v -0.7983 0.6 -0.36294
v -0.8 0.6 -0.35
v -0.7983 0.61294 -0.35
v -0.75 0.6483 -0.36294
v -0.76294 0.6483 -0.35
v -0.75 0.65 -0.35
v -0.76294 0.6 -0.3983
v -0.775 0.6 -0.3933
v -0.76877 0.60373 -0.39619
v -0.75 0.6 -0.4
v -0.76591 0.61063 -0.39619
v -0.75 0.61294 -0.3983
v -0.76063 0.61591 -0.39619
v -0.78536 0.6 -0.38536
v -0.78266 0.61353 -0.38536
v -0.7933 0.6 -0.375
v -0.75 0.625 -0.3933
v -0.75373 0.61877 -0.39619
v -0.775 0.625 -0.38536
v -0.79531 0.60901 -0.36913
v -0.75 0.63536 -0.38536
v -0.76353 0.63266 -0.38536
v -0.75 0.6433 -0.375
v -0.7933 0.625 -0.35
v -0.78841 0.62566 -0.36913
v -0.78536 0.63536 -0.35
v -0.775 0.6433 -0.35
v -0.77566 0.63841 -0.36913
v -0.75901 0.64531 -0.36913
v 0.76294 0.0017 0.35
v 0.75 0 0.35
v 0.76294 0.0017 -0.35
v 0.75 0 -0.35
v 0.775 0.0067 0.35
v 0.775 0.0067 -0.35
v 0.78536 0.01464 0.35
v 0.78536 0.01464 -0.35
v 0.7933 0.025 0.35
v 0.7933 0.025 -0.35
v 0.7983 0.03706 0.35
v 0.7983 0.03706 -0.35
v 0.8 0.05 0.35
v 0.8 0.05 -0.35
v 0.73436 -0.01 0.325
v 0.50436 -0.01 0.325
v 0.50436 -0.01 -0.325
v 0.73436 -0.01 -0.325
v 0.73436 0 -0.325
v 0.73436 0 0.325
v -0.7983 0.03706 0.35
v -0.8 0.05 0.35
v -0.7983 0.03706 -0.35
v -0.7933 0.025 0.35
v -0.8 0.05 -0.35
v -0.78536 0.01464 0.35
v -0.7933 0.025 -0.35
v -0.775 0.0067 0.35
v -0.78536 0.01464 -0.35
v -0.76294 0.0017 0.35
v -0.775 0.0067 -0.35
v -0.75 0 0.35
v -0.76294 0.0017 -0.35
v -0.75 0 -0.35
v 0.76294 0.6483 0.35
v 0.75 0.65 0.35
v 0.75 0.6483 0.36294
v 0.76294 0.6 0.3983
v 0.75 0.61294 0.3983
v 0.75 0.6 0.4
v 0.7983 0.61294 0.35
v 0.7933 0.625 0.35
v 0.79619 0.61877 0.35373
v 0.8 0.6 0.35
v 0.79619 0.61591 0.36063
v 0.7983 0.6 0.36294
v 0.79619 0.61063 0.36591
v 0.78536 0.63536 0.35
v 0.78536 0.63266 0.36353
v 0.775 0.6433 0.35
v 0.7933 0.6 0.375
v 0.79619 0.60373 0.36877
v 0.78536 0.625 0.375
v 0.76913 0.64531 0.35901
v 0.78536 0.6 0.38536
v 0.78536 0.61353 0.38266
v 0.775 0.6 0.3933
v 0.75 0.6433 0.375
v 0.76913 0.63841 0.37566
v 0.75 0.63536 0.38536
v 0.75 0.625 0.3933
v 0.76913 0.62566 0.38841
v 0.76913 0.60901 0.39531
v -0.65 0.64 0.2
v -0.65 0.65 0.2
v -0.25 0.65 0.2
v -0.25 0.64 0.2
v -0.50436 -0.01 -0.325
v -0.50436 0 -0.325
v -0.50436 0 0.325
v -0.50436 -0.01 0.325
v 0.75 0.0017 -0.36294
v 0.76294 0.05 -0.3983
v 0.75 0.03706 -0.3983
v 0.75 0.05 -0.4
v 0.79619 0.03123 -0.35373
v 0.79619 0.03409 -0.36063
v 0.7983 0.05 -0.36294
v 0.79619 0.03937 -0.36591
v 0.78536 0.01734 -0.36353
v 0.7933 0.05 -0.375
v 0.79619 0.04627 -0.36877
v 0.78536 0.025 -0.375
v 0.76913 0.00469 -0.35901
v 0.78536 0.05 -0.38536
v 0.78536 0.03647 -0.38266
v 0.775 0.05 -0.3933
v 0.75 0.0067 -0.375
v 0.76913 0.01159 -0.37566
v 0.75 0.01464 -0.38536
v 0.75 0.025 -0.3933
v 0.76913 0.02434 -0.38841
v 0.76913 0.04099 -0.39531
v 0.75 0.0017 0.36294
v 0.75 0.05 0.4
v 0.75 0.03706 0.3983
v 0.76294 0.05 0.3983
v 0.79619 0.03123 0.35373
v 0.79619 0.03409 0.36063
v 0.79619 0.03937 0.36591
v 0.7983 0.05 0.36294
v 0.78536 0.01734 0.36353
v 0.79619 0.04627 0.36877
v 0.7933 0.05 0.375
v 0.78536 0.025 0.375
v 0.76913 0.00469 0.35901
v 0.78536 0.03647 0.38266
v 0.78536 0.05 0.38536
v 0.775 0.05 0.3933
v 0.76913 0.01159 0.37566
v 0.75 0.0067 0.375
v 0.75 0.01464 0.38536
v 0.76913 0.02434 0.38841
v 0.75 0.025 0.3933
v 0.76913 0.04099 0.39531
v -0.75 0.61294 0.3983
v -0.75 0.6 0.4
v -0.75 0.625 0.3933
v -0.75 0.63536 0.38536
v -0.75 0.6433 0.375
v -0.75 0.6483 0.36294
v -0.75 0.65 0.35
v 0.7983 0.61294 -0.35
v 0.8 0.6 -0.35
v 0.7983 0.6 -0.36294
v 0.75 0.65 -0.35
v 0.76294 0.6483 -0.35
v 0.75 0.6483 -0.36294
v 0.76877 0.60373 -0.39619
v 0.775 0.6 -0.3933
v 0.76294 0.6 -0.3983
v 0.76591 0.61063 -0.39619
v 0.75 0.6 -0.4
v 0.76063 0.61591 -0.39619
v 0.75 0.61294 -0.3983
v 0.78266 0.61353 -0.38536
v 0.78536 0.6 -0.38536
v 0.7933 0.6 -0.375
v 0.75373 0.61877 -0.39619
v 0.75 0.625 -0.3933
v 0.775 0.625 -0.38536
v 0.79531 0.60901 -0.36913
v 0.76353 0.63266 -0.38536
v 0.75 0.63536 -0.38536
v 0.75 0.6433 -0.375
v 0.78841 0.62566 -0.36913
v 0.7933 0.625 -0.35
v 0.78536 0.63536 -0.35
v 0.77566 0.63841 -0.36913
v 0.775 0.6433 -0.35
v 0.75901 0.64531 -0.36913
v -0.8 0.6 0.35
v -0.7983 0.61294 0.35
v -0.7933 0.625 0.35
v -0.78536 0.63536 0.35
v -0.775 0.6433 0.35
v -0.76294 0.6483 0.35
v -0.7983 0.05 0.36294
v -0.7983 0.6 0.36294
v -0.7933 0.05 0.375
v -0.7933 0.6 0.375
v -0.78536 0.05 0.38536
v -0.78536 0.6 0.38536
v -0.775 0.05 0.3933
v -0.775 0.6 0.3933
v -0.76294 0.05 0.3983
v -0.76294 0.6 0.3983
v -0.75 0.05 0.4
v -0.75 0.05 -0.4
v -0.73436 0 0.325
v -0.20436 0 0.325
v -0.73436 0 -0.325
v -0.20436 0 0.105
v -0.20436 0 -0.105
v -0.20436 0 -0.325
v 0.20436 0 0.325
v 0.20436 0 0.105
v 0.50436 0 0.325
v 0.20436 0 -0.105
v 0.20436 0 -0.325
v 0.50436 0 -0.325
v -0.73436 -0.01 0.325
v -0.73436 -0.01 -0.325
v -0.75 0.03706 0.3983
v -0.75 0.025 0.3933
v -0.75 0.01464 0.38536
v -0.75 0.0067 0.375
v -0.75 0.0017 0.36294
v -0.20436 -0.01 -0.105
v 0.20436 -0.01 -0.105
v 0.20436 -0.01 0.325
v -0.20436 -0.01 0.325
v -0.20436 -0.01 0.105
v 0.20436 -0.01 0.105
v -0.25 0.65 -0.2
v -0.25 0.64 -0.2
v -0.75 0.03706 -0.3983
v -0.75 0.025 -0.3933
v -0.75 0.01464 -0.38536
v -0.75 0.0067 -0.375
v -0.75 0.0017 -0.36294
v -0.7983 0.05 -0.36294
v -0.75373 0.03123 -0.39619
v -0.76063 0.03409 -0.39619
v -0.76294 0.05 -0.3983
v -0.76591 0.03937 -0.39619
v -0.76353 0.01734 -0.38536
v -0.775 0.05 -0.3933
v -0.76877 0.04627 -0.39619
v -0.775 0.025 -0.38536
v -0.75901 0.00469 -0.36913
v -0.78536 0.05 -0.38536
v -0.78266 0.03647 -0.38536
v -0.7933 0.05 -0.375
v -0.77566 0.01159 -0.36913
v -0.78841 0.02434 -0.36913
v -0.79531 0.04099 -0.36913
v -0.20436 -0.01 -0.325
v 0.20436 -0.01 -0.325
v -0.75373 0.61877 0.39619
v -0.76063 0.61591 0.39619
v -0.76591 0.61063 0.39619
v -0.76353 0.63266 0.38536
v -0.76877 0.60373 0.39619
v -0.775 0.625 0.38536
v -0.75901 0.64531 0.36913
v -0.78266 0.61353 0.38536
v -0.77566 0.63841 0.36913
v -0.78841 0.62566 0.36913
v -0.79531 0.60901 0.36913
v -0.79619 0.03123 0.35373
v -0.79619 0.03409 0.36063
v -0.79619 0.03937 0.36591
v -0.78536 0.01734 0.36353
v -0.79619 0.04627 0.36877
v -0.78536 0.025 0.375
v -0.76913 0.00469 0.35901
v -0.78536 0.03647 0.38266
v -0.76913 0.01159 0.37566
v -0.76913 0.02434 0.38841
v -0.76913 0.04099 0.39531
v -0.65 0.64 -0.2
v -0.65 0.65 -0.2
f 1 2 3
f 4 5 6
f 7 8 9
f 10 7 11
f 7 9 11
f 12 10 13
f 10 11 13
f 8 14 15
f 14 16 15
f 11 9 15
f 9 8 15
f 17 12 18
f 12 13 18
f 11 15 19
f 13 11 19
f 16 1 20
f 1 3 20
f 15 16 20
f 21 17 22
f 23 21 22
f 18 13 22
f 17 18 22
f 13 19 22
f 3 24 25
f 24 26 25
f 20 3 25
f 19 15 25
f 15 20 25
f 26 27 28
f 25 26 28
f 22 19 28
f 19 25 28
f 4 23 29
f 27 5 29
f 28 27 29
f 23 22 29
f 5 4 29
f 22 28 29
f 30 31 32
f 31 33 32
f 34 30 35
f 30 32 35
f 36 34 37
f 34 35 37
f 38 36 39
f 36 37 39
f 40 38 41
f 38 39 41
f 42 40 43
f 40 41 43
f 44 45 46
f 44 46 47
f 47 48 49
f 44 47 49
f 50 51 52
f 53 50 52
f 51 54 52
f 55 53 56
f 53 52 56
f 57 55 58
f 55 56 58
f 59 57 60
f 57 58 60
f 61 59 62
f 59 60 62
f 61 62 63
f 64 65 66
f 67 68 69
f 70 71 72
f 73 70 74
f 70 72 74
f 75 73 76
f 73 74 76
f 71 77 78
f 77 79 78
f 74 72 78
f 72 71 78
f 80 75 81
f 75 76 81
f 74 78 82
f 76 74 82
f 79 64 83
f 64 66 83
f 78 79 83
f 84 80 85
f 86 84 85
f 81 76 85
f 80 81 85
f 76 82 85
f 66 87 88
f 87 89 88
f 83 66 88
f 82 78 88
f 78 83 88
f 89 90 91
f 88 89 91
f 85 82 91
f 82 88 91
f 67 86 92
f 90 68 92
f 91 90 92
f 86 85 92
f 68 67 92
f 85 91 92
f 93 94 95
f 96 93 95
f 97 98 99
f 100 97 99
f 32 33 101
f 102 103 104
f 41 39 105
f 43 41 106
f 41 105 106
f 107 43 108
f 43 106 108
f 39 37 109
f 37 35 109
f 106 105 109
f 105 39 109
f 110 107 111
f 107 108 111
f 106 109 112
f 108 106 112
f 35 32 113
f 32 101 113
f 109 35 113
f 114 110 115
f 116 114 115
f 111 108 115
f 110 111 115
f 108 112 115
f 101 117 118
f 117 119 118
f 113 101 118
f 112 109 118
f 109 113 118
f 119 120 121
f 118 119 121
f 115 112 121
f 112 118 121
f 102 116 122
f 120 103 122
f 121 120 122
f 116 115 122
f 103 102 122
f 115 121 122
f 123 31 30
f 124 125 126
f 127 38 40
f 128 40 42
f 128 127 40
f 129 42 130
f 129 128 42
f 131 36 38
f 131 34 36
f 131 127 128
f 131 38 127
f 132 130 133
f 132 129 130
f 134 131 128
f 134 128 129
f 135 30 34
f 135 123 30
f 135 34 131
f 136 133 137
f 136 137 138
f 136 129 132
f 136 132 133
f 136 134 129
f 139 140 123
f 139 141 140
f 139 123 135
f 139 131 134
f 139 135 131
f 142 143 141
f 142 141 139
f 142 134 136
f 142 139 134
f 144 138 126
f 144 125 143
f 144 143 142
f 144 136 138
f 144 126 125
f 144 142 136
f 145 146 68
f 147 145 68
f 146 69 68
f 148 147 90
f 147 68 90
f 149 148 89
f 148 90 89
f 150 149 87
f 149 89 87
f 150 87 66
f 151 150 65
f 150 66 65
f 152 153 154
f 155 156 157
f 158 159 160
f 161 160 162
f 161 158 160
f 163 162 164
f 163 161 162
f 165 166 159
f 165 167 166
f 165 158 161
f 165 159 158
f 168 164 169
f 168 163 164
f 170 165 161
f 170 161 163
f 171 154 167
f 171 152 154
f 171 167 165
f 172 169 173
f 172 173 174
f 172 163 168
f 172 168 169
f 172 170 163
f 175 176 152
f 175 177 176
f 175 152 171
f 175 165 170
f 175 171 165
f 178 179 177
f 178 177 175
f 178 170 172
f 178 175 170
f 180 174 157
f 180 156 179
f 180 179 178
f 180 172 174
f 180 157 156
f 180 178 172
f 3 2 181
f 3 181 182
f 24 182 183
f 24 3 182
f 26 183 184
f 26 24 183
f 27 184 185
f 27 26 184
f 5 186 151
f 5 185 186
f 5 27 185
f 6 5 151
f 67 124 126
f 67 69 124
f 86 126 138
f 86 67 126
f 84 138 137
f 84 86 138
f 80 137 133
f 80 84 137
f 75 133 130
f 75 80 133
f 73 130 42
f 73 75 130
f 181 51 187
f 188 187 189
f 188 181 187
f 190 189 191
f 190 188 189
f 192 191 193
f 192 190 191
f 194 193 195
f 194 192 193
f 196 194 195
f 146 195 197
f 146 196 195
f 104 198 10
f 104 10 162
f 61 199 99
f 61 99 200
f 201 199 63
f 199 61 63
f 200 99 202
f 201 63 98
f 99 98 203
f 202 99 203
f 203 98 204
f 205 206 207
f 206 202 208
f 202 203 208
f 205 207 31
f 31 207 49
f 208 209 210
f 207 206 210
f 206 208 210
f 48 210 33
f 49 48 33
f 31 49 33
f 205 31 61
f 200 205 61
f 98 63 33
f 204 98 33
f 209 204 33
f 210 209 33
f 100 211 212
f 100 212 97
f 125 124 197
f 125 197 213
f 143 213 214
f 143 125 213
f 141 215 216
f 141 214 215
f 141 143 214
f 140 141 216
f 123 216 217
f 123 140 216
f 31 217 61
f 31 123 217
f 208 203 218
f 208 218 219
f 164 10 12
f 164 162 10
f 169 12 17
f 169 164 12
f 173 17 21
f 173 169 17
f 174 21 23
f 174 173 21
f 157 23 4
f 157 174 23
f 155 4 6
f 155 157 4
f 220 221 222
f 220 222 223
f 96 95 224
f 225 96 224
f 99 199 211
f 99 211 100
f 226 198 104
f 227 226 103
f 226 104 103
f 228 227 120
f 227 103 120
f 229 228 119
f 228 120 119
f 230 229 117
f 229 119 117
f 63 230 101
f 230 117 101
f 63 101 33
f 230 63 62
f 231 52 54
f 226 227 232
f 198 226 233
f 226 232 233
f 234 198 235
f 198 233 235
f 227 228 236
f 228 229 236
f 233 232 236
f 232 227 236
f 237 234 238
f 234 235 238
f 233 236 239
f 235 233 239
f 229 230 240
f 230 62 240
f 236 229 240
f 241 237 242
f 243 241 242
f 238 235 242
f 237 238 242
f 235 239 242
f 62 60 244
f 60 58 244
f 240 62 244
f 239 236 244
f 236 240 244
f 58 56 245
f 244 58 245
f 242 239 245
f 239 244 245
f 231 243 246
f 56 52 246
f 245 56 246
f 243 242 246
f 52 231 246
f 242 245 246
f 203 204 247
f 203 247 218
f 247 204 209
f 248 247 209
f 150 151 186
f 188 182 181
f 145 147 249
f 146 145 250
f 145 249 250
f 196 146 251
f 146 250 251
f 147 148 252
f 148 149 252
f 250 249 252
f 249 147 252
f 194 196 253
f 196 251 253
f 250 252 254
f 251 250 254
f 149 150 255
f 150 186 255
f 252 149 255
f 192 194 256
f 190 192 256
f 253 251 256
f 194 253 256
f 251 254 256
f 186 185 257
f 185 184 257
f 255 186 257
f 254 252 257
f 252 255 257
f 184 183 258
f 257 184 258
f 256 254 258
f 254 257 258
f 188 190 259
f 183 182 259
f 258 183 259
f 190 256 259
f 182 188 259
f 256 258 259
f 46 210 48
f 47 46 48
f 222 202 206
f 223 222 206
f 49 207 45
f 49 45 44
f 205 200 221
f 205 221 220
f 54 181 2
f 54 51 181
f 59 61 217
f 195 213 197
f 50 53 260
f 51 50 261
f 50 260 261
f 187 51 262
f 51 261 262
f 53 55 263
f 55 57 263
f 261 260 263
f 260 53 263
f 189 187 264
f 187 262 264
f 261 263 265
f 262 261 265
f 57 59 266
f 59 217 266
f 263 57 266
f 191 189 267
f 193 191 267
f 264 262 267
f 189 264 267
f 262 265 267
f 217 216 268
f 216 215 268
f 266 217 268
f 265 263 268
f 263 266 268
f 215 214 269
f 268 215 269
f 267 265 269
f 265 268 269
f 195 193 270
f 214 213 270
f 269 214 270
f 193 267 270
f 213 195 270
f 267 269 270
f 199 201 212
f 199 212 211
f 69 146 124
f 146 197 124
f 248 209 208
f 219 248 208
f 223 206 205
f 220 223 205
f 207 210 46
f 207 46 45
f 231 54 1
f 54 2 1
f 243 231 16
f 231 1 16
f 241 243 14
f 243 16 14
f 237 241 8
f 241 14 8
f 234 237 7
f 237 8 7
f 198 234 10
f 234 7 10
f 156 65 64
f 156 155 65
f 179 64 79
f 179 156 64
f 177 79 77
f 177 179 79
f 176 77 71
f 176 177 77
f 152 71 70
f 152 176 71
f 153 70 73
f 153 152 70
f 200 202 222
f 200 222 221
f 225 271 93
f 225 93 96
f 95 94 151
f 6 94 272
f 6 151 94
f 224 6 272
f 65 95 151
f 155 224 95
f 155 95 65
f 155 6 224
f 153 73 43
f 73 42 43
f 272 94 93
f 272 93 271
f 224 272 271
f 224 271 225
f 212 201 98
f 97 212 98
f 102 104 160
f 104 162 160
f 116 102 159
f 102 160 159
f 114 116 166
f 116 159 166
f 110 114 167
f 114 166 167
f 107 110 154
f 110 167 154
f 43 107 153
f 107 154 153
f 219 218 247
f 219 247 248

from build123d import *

# Parameters (mm, degrees)
SKETCH1_W           = 1.6
SKETCH1_H           = 0.8
BOSS_EXTRUDE1_DEPTH = 0.65
SKETCH2_W           = 0.23
SKETCH2_H           = 0.65
SKETCH2_W_2         = 0.408711406
SKETCH2_H_2         = 0.22
BOSS_EXTRUDE2_DEPTH = 0.01
FILLET1_R           = 0.05
SKETCH3_W           = 0.4
SKETCH3_H           = 0.4
CUT_EXTRUDE1_DEPTH  = 0.01


with BuildPart() as part:
    # Sketch1 → Boss-Extrude1 (new body)
    with BuildSketch(Plane(origin=(0, 0, 0), x_dir=(1, 0, 0), z_dir=(0, 1, 0))):
        Rectangle(SKETCH1_W, SKETCH1_H)
    extrude(amount=BOSS_EXTRUDE1_DEPTH)

    # Sketch2 → Boss-Extrude2 (add)
    with BuildSketch(Plane.XZ):
        with Locations((-0.619355703, 0)):
            Rectangle(SKETCH2_W, SKETCH2_H)
        with Locations((0.619355703, 0)):
            Rectangle(SKETCH2_W, SKETCH2_H)
        with Locations((0, -0.215)):
            Rectangle(SKETCH2_W_2, SKETCH2_H_2)
        with Locations((0, 0.215)):
            Rectangle(SKETCH2_W_2, SKETCH2_H_2)
    extrude(amount=BOSS_EXTRUDE2_DEPTH)

    # Fillet1
    fillet1_edges = [part.edges().sort_by_distance(p)[0] for p in [
        (-0.8, 0.65, 0),
        (0, 0.65, 0.4),
        (0.8, 0.65, 0),
        (0, 0, 0.4),
        (-0.8, 0, 0),
        (0, 0, -0.4),
        (0.8, 0, 0),
        (0.8, 0.325, 0.4),
        (-0.8, 0.325, 0.4),
        (-0.8, 0.325, -0.4),
        (0.8, 0.325, -0.4),
        (0, 0.65, -0.4),
    ]]
    fillet(fillet1_edges, radius=FILLET1_R)

    # Sketch3 → Cut-Extrude1 (cut)
    with BuildSketch(Plane(origin=(0, 0.65, 0), x_dir=(1, 0, 0), z_dir=(0, 1, 0))):
        with Locations((-0.45, 0)):
            Rectangle(SKETCH3_W, SKETCH3_H)
    extrude(amount=-CUT_EXTRUDE1_DEPTH, mode=Mode.SUBTRACT)


solid = part.part
